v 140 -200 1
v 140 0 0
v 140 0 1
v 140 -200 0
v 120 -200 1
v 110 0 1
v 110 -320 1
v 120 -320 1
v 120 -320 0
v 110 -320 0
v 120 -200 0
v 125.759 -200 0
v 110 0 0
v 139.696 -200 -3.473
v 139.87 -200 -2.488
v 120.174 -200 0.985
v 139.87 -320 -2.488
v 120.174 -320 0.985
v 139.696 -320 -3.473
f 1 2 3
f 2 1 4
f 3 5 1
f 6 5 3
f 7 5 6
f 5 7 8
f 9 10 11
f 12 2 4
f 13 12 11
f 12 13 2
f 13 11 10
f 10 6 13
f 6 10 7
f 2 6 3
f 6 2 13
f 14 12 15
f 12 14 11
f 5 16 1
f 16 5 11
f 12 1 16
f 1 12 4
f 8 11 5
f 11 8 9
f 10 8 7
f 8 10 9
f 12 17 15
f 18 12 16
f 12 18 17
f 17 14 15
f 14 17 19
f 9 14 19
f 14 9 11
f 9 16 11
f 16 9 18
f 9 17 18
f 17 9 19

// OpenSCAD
module aileronCard(chordLength, strutSpacing,strutsPerWing, aileronLength, aileronChord, aileronAngle, overlap){
spanLength = strutSpacing*strutsPerWing;
translate([chordLength-overlap,-spanLength,0]){
	union(){
		translate([0,aileronLength,0]) cube([aileronChord+overlap,spanLength-aileronLength,1]);
		cube([overlap, spanLength, 1]);
}
	translate([overlap,0,0]) rotate([0,aileronAngle,0]) cube([aileronChord, aileronLength, 1]);
	}
}
aileronCard(120, 40, 8, 120, 20, 10, 10);
